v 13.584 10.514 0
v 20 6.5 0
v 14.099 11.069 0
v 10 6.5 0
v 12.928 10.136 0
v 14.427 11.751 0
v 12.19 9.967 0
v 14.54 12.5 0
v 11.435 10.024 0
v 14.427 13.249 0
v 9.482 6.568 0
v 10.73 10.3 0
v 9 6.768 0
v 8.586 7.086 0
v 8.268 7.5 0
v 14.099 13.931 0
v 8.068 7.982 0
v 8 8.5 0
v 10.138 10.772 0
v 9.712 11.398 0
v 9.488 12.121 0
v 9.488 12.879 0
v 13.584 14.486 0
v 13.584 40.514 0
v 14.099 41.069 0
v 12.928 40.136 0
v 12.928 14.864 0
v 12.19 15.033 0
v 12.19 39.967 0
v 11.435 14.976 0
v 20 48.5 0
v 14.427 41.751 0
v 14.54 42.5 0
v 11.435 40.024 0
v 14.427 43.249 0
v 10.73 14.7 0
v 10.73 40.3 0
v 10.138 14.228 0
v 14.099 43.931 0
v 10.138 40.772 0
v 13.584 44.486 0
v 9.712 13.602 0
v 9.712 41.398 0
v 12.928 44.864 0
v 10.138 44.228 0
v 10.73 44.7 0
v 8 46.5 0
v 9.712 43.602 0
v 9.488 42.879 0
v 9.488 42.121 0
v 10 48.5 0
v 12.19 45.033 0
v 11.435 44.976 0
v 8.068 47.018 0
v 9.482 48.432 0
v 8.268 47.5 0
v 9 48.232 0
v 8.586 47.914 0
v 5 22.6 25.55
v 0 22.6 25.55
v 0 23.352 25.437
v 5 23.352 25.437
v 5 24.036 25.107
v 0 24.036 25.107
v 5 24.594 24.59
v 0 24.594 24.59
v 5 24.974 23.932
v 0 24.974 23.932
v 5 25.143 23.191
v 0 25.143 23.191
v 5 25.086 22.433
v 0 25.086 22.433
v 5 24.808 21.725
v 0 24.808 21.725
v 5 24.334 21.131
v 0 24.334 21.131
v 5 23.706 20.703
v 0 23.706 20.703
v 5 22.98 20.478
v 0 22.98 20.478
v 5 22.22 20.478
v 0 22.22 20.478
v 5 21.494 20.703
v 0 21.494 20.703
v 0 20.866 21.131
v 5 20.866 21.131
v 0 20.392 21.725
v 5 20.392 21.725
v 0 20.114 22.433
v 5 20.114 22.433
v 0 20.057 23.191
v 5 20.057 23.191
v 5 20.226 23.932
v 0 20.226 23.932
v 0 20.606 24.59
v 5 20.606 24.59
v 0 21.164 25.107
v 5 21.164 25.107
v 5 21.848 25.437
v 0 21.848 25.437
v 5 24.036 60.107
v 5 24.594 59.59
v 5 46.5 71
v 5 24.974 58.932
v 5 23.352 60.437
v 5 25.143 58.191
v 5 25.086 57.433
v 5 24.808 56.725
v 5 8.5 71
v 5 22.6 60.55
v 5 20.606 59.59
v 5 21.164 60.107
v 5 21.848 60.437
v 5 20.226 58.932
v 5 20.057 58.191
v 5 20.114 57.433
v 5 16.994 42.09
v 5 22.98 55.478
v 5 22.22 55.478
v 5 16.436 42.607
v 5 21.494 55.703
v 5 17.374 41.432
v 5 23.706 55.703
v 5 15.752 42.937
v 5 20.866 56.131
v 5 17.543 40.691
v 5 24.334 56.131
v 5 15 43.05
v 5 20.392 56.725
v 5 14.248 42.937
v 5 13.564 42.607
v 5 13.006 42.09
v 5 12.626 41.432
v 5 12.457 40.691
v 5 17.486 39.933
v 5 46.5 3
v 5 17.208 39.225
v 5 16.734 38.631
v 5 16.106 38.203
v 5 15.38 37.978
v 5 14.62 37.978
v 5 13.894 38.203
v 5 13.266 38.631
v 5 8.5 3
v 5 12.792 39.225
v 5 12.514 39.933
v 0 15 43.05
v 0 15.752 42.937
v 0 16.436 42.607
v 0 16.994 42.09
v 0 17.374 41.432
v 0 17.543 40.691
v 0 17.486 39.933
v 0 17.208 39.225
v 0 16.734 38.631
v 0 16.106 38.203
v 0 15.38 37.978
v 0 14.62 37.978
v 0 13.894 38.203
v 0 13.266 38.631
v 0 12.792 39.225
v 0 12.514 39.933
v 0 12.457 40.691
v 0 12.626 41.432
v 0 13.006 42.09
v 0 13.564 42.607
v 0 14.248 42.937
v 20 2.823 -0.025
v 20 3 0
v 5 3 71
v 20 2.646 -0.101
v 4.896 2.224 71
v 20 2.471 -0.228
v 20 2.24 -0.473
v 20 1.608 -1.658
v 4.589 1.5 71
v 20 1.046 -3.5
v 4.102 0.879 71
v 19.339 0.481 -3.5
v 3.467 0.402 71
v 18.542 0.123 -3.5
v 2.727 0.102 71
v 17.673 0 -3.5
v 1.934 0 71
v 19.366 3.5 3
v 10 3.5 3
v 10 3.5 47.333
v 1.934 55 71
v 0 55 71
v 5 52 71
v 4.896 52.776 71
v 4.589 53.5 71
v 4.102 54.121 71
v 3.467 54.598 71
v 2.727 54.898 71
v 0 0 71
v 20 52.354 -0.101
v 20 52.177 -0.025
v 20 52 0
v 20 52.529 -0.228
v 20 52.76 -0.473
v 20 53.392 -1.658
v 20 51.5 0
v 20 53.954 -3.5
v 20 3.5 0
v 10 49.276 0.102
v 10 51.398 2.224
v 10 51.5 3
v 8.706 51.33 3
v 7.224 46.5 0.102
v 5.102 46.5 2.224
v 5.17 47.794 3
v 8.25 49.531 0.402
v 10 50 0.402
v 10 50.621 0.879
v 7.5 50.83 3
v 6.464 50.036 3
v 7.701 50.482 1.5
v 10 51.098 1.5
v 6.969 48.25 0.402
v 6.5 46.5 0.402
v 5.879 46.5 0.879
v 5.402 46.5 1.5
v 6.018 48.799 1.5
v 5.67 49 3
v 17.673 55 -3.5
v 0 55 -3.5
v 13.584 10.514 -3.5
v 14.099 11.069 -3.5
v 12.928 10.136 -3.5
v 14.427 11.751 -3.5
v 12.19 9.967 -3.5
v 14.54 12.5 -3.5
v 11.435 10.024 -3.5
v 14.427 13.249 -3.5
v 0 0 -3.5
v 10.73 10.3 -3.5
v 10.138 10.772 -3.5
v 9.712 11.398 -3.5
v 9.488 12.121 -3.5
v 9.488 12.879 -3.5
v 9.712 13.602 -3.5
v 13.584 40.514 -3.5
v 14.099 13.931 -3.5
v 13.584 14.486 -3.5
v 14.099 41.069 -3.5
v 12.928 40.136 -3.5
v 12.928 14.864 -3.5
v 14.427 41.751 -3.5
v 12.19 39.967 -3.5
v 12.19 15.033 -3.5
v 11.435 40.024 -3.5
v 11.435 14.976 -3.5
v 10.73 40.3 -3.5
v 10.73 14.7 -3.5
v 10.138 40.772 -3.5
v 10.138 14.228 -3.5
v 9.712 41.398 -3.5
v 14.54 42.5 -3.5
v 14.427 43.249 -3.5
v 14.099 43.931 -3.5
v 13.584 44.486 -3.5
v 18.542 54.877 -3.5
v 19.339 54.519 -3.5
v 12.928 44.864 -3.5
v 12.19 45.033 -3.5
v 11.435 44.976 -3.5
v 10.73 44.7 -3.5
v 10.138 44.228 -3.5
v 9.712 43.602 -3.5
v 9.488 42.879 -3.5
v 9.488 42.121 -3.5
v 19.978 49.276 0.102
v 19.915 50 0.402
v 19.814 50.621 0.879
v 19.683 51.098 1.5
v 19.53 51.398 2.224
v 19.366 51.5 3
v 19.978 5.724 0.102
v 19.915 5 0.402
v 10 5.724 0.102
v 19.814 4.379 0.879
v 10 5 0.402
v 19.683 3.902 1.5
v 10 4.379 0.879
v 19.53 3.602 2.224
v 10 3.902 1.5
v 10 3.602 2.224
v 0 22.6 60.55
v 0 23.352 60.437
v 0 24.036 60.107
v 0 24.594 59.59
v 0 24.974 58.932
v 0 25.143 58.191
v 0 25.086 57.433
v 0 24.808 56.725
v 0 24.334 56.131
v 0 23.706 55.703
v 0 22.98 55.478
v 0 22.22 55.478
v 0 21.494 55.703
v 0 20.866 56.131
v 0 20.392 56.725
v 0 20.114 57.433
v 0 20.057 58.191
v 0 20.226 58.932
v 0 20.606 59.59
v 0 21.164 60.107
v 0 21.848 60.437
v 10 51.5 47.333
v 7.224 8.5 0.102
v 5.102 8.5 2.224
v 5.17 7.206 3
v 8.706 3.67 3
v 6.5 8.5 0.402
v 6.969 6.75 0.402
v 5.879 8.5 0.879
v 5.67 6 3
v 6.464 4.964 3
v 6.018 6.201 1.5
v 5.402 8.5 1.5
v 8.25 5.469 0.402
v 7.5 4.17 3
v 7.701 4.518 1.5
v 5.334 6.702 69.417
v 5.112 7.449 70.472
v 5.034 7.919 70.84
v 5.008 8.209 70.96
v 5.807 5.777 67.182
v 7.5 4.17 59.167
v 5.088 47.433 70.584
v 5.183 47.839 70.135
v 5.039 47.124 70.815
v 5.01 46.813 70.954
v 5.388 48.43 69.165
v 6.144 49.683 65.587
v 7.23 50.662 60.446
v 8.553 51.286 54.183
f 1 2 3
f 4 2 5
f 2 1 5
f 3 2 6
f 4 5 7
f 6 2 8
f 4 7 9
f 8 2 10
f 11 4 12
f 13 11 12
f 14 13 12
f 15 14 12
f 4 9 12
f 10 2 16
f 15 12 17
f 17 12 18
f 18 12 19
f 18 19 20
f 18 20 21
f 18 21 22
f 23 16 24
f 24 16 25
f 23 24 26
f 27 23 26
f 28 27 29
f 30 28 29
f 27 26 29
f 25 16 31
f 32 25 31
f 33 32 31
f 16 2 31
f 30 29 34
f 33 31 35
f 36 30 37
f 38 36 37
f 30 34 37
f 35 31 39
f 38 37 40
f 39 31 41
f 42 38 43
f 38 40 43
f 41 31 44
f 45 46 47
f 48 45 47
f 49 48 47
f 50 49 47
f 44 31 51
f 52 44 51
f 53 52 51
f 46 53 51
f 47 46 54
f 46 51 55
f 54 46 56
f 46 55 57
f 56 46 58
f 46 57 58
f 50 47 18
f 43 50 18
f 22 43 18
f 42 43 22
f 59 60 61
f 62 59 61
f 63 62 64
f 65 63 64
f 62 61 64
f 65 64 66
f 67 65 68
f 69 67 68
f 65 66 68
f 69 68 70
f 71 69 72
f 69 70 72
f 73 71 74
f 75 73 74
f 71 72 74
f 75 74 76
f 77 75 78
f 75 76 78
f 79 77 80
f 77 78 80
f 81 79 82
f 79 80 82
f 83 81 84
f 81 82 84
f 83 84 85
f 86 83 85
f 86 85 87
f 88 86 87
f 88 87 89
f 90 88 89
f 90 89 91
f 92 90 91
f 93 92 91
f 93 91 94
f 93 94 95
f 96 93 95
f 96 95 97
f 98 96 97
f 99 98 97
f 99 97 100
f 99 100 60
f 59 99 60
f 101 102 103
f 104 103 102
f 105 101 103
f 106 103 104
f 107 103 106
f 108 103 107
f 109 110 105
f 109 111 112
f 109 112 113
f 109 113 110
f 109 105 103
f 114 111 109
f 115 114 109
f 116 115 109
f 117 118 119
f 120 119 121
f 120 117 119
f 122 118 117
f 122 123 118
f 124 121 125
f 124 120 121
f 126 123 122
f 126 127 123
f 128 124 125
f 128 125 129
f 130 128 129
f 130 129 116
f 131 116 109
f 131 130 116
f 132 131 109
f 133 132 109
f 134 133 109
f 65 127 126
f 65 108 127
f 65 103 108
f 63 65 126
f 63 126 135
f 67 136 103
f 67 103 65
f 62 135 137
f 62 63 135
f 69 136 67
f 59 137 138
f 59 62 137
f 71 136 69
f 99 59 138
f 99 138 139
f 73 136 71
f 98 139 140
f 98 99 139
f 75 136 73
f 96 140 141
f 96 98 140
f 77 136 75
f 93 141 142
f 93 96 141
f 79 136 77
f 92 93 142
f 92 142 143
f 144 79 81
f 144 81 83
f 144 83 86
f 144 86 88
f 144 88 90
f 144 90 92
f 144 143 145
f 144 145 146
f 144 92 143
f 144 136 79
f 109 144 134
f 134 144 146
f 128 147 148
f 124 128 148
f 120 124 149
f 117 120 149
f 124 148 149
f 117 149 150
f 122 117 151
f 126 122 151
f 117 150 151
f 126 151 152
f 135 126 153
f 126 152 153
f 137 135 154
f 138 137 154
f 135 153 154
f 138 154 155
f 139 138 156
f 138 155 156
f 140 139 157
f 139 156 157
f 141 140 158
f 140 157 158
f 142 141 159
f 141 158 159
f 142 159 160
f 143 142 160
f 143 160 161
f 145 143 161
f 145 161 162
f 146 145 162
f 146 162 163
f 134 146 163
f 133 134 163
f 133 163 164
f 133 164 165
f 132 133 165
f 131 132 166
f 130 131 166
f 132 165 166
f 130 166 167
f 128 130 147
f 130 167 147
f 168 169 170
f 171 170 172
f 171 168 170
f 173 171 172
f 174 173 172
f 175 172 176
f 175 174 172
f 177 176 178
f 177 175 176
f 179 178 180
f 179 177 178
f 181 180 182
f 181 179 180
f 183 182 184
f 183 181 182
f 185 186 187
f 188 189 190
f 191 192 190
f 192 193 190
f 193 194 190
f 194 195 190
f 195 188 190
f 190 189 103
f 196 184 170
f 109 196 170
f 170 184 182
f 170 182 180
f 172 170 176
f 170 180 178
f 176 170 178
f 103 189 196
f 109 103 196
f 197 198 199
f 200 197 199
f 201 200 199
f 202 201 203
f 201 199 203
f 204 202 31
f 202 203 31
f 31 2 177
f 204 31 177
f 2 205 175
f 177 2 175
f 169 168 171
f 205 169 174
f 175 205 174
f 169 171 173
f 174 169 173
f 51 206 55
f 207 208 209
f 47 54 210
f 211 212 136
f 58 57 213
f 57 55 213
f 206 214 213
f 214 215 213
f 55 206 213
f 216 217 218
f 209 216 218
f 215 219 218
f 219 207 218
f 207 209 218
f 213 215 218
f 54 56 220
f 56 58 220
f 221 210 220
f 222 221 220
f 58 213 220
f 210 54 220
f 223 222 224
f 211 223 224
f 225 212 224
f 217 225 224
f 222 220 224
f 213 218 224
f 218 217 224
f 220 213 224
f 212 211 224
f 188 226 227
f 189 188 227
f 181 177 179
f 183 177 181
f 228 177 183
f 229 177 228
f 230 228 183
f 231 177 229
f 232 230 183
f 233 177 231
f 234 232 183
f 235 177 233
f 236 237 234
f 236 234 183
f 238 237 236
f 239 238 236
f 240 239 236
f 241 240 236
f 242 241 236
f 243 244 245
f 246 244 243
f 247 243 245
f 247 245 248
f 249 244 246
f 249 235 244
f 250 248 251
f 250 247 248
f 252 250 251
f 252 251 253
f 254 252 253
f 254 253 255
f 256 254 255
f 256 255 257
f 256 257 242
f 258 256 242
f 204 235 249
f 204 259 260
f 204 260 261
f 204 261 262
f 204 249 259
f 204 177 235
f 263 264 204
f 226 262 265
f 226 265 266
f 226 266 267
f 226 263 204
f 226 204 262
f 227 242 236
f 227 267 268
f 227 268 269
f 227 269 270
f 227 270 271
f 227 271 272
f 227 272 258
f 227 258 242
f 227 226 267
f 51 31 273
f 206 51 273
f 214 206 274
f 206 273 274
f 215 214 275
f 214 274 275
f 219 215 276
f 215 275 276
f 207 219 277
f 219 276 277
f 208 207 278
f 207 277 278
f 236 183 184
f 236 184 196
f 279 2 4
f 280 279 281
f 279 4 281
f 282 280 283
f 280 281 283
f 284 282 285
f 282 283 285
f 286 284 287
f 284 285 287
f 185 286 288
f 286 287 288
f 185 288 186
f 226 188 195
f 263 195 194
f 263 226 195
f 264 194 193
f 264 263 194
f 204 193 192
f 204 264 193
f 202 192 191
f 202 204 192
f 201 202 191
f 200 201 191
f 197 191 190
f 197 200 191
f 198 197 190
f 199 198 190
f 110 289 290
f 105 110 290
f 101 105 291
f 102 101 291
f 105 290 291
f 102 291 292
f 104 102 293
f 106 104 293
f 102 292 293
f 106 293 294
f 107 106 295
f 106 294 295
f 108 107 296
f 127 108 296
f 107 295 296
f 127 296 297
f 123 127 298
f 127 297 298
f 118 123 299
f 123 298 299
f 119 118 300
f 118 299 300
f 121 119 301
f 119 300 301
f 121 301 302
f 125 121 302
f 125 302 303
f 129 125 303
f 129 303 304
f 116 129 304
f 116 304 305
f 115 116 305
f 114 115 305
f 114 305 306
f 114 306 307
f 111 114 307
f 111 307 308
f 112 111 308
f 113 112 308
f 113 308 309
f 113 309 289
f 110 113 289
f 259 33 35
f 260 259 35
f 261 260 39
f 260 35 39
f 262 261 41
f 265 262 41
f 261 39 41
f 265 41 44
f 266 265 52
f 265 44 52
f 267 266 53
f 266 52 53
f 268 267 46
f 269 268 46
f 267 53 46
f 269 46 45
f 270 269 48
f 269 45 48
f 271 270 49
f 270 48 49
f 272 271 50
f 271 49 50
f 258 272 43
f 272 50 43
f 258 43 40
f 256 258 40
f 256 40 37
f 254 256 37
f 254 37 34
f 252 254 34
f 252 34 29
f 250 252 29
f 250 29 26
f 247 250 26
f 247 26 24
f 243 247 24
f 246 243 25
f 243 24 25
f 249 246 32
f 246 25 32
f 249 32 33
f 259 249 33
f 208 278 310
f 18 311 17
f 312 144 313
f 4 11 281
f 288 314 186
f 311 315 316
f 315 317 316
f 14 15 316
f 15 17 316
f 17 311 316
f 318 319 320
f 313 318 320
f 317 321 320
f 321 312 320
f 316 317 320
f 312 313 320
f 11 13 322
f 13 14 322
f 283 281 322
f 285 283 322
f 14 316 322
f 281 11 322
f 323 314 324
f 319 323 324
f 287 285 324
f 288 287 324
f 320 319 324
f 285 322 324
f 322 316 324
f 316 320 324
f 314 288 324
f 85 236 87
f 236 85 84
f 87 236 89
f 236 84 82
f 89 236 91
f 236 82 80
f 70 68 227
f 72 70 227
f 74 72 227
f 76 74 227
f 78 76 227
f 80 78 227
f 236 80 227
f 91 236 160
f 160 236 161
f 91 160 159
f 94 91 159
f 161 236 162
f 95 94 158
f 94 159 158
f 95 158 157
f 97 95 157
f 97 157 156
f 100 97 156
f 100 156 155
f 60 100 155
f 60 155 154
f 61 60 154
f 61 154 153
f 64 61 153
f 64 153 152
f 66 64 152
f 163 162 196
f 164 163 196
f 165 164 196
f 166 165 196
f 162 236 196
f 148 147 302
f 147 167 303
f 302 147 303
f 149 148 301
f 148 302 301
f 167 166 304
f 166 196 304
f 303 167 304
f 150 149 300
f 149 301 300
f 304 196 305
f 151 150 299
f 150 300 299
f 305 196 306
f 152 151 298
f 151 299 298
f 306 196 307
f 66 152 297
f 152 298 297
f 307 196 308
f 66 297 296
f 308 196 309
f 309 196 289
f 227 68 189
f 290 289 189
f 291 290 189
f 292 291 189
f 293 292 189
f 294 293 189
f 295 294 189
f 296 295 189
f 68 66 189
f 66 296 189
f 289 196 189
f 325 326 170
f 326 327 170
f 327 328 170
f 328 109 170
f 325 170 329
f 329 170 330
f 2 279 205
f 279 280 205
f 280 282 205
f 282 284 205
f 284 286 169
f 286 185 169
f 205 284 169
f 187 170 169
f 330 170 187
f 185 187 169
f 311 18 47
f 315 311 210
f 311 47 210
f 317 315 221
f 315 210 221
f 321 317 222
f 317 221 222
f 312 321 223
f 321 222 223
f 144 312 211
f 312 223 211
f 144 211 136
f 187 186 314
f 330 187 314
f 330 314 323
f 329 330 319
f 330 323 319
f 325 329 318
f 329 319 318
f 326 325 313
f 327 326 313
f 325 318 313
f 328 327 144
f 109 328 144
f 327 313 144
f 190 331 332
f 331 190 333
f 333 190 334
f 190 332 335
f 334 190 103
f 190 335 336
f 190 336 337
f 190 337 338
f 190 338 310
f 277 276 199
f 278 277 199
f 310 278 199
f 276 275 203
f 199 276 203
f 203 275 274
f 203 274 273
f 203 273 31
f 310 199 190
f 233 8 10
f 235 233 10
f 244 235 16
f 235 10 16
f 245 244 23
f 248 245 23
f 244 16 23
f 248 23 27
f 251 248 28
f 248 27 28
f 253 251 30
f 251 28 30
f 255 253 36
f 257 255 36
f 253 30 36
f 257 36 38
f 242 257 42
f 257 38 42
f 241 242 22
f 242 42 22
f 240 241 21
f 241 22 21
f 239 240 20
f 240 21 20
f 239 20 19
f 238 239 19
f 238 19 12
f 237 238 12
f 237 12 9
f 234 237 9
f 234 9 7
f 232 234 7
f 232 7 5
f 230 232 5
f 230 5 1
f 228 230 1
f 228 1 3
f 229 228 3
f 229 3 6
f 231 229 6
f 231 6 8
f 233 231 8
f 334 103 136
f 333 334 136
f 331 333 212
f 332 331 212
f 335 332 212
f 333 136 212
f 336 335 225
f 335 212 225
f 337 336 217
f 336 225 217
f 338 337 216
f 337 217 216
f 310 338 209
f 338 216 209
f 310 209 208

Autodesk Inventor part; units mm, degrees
ref_plane "YZ Plane" through (0, 0, 0) normal (1, 0, 0) x (0, 1, 0)
ref_plane "XZ Plane" through (0, 0, 0) normal (0, 1, 0) x (-1, 0, 0)
ref_plane "XY Plane" through (0, 0, 0) normal (0, 0, 1) x (1, 0, 0)
sketch "Sketch1" plane through (0, 0, 0) normal (0, 1, 0) x (-1, 0, 0)
  line L0 (0, 0) -> (0, 71)
  line L1 (0, 71) -> (-5, 71)
  line L2 (-5, 71) -> (-20, 0)
  line L3 (-20, 0) -> (0, 0)
  dimension "d0" = 71
  dimension "d1" = 20
  dimension "d2" = 5
extrude "Extrusion1" add sketch "Sketch1" along normal blind 55
sketch "Sketch2" plane through (0, 0, 0) normal (-1, 0, 0) x (0, 0, 1)
  circle A0 centre (23, 22.6) radius 2.55
  circle A1 centre (58, 22.6) radius 2.55
  circle A2 centre (40.5, 15) radius 2.55
  line L0 (23, 22.6) -> (58, 22.6) construction
  line L1 (40.5, 22.6) -> (40.5, 15) construction
  line L2 (71, 0) -> (71, 55) construction
  point P0 (0, 0)
  dimension "d5" = 5.1
  dimension "d6" = 35
  dimension "d7" = 7.6
  dimension "d8" = 15
  dimension "d9" = 30.5
extrude "Extrusion2" cut sketch "Sketch2" against normal blind 45
sketch "Sketch3" plane through (20, 0, 0) normal (0, 0, -1) x (-1, 0, 0)
  line L0 (0, 0) -> (0, 55) projected
  line L1 (0, 51.5) -> (10, 51.5)
  arc A0 (15, 46.5) -> (10, 51.5) centre (10, 46.5) ccw
  line L2 (15, 46.5) -> (15, 8.5)
  arc A1 (10, 3.5) -> (15, 8.5) centre (10, 8.5) ccw
  line L3 (10, 3.5) -> (0, 3.5)
  line L4 (15, 27.5) -> (0, 27.5) construction
  point P0 (20, 0)
  dimension "d12" = 3.5
  dimension "d13" = 3.5
  dimension "d14" = 5
  dimension "d15" = 5
extrude "Extrusion3" cut sketch "Sketch3" against normal through all
sketch "Sketch5" plane through (20, 0, 0) normal (0, 0, -1) x (-1, 0, 0)
  line L0 (20, 0) -> (20, 55) projected
  line L1 (0, 55) -> (20, 55) projected
  line L2 (0, 0) -> (20, 0) projected
  line L3 (0, 51.5) -> (0, 55) projected
  line L4 (0, 55) -> (0, 0)
extrude "Extrusion4" add sketch "Sketch5" along normal blind 3.5
sketch "Sketch6" plane through (20, 0, 0) normal (0, 0, 1) x (1, 0, 0)
  circle A0 centre (-8, 12.5) radius 2.54
  circle A1 centre (-8, 42.5) radius 2.54
  line L0 (-8, 12.5) -> (-8, 42.5) construction
  line L1 (-20, 0) -> (-20, 55) projected
  line L2 (-20, 27.5) -> (-8, 27.5) construction
  line L3 (-15, 8.5) -> (-15, 46.5) construction
  line L4 (0, 51.5) -> (0, 3.5) construction
  line L5 (-15, 46.5) -> (-15, 8.5) projected
  line L6 (-15, 12.5) -> (-8, 12.5) construction
  line L7 (-8, 12.5) -> (0, 12.5) construction
  dimension "d20" = 5.08
  dimension "d21" = 30
  dimension "d22" = 8
extrude "Extrusion5" cut sketch "Sketch6" against normal through all
fillet "Fillet1" radius 3 5 edges at (6.4645, 4.9645, 0) (15, 3.5, 0) (6.4645, 50.0355, 0) (15, 51.5, 0) (5, 27.5, 0)
fillet "Fillet2" radius 3 2 edges at (12.5, 0, 35.5) (12.5, 55, 35.5)
properties part number "Cable_Chain_Side_Holder"
